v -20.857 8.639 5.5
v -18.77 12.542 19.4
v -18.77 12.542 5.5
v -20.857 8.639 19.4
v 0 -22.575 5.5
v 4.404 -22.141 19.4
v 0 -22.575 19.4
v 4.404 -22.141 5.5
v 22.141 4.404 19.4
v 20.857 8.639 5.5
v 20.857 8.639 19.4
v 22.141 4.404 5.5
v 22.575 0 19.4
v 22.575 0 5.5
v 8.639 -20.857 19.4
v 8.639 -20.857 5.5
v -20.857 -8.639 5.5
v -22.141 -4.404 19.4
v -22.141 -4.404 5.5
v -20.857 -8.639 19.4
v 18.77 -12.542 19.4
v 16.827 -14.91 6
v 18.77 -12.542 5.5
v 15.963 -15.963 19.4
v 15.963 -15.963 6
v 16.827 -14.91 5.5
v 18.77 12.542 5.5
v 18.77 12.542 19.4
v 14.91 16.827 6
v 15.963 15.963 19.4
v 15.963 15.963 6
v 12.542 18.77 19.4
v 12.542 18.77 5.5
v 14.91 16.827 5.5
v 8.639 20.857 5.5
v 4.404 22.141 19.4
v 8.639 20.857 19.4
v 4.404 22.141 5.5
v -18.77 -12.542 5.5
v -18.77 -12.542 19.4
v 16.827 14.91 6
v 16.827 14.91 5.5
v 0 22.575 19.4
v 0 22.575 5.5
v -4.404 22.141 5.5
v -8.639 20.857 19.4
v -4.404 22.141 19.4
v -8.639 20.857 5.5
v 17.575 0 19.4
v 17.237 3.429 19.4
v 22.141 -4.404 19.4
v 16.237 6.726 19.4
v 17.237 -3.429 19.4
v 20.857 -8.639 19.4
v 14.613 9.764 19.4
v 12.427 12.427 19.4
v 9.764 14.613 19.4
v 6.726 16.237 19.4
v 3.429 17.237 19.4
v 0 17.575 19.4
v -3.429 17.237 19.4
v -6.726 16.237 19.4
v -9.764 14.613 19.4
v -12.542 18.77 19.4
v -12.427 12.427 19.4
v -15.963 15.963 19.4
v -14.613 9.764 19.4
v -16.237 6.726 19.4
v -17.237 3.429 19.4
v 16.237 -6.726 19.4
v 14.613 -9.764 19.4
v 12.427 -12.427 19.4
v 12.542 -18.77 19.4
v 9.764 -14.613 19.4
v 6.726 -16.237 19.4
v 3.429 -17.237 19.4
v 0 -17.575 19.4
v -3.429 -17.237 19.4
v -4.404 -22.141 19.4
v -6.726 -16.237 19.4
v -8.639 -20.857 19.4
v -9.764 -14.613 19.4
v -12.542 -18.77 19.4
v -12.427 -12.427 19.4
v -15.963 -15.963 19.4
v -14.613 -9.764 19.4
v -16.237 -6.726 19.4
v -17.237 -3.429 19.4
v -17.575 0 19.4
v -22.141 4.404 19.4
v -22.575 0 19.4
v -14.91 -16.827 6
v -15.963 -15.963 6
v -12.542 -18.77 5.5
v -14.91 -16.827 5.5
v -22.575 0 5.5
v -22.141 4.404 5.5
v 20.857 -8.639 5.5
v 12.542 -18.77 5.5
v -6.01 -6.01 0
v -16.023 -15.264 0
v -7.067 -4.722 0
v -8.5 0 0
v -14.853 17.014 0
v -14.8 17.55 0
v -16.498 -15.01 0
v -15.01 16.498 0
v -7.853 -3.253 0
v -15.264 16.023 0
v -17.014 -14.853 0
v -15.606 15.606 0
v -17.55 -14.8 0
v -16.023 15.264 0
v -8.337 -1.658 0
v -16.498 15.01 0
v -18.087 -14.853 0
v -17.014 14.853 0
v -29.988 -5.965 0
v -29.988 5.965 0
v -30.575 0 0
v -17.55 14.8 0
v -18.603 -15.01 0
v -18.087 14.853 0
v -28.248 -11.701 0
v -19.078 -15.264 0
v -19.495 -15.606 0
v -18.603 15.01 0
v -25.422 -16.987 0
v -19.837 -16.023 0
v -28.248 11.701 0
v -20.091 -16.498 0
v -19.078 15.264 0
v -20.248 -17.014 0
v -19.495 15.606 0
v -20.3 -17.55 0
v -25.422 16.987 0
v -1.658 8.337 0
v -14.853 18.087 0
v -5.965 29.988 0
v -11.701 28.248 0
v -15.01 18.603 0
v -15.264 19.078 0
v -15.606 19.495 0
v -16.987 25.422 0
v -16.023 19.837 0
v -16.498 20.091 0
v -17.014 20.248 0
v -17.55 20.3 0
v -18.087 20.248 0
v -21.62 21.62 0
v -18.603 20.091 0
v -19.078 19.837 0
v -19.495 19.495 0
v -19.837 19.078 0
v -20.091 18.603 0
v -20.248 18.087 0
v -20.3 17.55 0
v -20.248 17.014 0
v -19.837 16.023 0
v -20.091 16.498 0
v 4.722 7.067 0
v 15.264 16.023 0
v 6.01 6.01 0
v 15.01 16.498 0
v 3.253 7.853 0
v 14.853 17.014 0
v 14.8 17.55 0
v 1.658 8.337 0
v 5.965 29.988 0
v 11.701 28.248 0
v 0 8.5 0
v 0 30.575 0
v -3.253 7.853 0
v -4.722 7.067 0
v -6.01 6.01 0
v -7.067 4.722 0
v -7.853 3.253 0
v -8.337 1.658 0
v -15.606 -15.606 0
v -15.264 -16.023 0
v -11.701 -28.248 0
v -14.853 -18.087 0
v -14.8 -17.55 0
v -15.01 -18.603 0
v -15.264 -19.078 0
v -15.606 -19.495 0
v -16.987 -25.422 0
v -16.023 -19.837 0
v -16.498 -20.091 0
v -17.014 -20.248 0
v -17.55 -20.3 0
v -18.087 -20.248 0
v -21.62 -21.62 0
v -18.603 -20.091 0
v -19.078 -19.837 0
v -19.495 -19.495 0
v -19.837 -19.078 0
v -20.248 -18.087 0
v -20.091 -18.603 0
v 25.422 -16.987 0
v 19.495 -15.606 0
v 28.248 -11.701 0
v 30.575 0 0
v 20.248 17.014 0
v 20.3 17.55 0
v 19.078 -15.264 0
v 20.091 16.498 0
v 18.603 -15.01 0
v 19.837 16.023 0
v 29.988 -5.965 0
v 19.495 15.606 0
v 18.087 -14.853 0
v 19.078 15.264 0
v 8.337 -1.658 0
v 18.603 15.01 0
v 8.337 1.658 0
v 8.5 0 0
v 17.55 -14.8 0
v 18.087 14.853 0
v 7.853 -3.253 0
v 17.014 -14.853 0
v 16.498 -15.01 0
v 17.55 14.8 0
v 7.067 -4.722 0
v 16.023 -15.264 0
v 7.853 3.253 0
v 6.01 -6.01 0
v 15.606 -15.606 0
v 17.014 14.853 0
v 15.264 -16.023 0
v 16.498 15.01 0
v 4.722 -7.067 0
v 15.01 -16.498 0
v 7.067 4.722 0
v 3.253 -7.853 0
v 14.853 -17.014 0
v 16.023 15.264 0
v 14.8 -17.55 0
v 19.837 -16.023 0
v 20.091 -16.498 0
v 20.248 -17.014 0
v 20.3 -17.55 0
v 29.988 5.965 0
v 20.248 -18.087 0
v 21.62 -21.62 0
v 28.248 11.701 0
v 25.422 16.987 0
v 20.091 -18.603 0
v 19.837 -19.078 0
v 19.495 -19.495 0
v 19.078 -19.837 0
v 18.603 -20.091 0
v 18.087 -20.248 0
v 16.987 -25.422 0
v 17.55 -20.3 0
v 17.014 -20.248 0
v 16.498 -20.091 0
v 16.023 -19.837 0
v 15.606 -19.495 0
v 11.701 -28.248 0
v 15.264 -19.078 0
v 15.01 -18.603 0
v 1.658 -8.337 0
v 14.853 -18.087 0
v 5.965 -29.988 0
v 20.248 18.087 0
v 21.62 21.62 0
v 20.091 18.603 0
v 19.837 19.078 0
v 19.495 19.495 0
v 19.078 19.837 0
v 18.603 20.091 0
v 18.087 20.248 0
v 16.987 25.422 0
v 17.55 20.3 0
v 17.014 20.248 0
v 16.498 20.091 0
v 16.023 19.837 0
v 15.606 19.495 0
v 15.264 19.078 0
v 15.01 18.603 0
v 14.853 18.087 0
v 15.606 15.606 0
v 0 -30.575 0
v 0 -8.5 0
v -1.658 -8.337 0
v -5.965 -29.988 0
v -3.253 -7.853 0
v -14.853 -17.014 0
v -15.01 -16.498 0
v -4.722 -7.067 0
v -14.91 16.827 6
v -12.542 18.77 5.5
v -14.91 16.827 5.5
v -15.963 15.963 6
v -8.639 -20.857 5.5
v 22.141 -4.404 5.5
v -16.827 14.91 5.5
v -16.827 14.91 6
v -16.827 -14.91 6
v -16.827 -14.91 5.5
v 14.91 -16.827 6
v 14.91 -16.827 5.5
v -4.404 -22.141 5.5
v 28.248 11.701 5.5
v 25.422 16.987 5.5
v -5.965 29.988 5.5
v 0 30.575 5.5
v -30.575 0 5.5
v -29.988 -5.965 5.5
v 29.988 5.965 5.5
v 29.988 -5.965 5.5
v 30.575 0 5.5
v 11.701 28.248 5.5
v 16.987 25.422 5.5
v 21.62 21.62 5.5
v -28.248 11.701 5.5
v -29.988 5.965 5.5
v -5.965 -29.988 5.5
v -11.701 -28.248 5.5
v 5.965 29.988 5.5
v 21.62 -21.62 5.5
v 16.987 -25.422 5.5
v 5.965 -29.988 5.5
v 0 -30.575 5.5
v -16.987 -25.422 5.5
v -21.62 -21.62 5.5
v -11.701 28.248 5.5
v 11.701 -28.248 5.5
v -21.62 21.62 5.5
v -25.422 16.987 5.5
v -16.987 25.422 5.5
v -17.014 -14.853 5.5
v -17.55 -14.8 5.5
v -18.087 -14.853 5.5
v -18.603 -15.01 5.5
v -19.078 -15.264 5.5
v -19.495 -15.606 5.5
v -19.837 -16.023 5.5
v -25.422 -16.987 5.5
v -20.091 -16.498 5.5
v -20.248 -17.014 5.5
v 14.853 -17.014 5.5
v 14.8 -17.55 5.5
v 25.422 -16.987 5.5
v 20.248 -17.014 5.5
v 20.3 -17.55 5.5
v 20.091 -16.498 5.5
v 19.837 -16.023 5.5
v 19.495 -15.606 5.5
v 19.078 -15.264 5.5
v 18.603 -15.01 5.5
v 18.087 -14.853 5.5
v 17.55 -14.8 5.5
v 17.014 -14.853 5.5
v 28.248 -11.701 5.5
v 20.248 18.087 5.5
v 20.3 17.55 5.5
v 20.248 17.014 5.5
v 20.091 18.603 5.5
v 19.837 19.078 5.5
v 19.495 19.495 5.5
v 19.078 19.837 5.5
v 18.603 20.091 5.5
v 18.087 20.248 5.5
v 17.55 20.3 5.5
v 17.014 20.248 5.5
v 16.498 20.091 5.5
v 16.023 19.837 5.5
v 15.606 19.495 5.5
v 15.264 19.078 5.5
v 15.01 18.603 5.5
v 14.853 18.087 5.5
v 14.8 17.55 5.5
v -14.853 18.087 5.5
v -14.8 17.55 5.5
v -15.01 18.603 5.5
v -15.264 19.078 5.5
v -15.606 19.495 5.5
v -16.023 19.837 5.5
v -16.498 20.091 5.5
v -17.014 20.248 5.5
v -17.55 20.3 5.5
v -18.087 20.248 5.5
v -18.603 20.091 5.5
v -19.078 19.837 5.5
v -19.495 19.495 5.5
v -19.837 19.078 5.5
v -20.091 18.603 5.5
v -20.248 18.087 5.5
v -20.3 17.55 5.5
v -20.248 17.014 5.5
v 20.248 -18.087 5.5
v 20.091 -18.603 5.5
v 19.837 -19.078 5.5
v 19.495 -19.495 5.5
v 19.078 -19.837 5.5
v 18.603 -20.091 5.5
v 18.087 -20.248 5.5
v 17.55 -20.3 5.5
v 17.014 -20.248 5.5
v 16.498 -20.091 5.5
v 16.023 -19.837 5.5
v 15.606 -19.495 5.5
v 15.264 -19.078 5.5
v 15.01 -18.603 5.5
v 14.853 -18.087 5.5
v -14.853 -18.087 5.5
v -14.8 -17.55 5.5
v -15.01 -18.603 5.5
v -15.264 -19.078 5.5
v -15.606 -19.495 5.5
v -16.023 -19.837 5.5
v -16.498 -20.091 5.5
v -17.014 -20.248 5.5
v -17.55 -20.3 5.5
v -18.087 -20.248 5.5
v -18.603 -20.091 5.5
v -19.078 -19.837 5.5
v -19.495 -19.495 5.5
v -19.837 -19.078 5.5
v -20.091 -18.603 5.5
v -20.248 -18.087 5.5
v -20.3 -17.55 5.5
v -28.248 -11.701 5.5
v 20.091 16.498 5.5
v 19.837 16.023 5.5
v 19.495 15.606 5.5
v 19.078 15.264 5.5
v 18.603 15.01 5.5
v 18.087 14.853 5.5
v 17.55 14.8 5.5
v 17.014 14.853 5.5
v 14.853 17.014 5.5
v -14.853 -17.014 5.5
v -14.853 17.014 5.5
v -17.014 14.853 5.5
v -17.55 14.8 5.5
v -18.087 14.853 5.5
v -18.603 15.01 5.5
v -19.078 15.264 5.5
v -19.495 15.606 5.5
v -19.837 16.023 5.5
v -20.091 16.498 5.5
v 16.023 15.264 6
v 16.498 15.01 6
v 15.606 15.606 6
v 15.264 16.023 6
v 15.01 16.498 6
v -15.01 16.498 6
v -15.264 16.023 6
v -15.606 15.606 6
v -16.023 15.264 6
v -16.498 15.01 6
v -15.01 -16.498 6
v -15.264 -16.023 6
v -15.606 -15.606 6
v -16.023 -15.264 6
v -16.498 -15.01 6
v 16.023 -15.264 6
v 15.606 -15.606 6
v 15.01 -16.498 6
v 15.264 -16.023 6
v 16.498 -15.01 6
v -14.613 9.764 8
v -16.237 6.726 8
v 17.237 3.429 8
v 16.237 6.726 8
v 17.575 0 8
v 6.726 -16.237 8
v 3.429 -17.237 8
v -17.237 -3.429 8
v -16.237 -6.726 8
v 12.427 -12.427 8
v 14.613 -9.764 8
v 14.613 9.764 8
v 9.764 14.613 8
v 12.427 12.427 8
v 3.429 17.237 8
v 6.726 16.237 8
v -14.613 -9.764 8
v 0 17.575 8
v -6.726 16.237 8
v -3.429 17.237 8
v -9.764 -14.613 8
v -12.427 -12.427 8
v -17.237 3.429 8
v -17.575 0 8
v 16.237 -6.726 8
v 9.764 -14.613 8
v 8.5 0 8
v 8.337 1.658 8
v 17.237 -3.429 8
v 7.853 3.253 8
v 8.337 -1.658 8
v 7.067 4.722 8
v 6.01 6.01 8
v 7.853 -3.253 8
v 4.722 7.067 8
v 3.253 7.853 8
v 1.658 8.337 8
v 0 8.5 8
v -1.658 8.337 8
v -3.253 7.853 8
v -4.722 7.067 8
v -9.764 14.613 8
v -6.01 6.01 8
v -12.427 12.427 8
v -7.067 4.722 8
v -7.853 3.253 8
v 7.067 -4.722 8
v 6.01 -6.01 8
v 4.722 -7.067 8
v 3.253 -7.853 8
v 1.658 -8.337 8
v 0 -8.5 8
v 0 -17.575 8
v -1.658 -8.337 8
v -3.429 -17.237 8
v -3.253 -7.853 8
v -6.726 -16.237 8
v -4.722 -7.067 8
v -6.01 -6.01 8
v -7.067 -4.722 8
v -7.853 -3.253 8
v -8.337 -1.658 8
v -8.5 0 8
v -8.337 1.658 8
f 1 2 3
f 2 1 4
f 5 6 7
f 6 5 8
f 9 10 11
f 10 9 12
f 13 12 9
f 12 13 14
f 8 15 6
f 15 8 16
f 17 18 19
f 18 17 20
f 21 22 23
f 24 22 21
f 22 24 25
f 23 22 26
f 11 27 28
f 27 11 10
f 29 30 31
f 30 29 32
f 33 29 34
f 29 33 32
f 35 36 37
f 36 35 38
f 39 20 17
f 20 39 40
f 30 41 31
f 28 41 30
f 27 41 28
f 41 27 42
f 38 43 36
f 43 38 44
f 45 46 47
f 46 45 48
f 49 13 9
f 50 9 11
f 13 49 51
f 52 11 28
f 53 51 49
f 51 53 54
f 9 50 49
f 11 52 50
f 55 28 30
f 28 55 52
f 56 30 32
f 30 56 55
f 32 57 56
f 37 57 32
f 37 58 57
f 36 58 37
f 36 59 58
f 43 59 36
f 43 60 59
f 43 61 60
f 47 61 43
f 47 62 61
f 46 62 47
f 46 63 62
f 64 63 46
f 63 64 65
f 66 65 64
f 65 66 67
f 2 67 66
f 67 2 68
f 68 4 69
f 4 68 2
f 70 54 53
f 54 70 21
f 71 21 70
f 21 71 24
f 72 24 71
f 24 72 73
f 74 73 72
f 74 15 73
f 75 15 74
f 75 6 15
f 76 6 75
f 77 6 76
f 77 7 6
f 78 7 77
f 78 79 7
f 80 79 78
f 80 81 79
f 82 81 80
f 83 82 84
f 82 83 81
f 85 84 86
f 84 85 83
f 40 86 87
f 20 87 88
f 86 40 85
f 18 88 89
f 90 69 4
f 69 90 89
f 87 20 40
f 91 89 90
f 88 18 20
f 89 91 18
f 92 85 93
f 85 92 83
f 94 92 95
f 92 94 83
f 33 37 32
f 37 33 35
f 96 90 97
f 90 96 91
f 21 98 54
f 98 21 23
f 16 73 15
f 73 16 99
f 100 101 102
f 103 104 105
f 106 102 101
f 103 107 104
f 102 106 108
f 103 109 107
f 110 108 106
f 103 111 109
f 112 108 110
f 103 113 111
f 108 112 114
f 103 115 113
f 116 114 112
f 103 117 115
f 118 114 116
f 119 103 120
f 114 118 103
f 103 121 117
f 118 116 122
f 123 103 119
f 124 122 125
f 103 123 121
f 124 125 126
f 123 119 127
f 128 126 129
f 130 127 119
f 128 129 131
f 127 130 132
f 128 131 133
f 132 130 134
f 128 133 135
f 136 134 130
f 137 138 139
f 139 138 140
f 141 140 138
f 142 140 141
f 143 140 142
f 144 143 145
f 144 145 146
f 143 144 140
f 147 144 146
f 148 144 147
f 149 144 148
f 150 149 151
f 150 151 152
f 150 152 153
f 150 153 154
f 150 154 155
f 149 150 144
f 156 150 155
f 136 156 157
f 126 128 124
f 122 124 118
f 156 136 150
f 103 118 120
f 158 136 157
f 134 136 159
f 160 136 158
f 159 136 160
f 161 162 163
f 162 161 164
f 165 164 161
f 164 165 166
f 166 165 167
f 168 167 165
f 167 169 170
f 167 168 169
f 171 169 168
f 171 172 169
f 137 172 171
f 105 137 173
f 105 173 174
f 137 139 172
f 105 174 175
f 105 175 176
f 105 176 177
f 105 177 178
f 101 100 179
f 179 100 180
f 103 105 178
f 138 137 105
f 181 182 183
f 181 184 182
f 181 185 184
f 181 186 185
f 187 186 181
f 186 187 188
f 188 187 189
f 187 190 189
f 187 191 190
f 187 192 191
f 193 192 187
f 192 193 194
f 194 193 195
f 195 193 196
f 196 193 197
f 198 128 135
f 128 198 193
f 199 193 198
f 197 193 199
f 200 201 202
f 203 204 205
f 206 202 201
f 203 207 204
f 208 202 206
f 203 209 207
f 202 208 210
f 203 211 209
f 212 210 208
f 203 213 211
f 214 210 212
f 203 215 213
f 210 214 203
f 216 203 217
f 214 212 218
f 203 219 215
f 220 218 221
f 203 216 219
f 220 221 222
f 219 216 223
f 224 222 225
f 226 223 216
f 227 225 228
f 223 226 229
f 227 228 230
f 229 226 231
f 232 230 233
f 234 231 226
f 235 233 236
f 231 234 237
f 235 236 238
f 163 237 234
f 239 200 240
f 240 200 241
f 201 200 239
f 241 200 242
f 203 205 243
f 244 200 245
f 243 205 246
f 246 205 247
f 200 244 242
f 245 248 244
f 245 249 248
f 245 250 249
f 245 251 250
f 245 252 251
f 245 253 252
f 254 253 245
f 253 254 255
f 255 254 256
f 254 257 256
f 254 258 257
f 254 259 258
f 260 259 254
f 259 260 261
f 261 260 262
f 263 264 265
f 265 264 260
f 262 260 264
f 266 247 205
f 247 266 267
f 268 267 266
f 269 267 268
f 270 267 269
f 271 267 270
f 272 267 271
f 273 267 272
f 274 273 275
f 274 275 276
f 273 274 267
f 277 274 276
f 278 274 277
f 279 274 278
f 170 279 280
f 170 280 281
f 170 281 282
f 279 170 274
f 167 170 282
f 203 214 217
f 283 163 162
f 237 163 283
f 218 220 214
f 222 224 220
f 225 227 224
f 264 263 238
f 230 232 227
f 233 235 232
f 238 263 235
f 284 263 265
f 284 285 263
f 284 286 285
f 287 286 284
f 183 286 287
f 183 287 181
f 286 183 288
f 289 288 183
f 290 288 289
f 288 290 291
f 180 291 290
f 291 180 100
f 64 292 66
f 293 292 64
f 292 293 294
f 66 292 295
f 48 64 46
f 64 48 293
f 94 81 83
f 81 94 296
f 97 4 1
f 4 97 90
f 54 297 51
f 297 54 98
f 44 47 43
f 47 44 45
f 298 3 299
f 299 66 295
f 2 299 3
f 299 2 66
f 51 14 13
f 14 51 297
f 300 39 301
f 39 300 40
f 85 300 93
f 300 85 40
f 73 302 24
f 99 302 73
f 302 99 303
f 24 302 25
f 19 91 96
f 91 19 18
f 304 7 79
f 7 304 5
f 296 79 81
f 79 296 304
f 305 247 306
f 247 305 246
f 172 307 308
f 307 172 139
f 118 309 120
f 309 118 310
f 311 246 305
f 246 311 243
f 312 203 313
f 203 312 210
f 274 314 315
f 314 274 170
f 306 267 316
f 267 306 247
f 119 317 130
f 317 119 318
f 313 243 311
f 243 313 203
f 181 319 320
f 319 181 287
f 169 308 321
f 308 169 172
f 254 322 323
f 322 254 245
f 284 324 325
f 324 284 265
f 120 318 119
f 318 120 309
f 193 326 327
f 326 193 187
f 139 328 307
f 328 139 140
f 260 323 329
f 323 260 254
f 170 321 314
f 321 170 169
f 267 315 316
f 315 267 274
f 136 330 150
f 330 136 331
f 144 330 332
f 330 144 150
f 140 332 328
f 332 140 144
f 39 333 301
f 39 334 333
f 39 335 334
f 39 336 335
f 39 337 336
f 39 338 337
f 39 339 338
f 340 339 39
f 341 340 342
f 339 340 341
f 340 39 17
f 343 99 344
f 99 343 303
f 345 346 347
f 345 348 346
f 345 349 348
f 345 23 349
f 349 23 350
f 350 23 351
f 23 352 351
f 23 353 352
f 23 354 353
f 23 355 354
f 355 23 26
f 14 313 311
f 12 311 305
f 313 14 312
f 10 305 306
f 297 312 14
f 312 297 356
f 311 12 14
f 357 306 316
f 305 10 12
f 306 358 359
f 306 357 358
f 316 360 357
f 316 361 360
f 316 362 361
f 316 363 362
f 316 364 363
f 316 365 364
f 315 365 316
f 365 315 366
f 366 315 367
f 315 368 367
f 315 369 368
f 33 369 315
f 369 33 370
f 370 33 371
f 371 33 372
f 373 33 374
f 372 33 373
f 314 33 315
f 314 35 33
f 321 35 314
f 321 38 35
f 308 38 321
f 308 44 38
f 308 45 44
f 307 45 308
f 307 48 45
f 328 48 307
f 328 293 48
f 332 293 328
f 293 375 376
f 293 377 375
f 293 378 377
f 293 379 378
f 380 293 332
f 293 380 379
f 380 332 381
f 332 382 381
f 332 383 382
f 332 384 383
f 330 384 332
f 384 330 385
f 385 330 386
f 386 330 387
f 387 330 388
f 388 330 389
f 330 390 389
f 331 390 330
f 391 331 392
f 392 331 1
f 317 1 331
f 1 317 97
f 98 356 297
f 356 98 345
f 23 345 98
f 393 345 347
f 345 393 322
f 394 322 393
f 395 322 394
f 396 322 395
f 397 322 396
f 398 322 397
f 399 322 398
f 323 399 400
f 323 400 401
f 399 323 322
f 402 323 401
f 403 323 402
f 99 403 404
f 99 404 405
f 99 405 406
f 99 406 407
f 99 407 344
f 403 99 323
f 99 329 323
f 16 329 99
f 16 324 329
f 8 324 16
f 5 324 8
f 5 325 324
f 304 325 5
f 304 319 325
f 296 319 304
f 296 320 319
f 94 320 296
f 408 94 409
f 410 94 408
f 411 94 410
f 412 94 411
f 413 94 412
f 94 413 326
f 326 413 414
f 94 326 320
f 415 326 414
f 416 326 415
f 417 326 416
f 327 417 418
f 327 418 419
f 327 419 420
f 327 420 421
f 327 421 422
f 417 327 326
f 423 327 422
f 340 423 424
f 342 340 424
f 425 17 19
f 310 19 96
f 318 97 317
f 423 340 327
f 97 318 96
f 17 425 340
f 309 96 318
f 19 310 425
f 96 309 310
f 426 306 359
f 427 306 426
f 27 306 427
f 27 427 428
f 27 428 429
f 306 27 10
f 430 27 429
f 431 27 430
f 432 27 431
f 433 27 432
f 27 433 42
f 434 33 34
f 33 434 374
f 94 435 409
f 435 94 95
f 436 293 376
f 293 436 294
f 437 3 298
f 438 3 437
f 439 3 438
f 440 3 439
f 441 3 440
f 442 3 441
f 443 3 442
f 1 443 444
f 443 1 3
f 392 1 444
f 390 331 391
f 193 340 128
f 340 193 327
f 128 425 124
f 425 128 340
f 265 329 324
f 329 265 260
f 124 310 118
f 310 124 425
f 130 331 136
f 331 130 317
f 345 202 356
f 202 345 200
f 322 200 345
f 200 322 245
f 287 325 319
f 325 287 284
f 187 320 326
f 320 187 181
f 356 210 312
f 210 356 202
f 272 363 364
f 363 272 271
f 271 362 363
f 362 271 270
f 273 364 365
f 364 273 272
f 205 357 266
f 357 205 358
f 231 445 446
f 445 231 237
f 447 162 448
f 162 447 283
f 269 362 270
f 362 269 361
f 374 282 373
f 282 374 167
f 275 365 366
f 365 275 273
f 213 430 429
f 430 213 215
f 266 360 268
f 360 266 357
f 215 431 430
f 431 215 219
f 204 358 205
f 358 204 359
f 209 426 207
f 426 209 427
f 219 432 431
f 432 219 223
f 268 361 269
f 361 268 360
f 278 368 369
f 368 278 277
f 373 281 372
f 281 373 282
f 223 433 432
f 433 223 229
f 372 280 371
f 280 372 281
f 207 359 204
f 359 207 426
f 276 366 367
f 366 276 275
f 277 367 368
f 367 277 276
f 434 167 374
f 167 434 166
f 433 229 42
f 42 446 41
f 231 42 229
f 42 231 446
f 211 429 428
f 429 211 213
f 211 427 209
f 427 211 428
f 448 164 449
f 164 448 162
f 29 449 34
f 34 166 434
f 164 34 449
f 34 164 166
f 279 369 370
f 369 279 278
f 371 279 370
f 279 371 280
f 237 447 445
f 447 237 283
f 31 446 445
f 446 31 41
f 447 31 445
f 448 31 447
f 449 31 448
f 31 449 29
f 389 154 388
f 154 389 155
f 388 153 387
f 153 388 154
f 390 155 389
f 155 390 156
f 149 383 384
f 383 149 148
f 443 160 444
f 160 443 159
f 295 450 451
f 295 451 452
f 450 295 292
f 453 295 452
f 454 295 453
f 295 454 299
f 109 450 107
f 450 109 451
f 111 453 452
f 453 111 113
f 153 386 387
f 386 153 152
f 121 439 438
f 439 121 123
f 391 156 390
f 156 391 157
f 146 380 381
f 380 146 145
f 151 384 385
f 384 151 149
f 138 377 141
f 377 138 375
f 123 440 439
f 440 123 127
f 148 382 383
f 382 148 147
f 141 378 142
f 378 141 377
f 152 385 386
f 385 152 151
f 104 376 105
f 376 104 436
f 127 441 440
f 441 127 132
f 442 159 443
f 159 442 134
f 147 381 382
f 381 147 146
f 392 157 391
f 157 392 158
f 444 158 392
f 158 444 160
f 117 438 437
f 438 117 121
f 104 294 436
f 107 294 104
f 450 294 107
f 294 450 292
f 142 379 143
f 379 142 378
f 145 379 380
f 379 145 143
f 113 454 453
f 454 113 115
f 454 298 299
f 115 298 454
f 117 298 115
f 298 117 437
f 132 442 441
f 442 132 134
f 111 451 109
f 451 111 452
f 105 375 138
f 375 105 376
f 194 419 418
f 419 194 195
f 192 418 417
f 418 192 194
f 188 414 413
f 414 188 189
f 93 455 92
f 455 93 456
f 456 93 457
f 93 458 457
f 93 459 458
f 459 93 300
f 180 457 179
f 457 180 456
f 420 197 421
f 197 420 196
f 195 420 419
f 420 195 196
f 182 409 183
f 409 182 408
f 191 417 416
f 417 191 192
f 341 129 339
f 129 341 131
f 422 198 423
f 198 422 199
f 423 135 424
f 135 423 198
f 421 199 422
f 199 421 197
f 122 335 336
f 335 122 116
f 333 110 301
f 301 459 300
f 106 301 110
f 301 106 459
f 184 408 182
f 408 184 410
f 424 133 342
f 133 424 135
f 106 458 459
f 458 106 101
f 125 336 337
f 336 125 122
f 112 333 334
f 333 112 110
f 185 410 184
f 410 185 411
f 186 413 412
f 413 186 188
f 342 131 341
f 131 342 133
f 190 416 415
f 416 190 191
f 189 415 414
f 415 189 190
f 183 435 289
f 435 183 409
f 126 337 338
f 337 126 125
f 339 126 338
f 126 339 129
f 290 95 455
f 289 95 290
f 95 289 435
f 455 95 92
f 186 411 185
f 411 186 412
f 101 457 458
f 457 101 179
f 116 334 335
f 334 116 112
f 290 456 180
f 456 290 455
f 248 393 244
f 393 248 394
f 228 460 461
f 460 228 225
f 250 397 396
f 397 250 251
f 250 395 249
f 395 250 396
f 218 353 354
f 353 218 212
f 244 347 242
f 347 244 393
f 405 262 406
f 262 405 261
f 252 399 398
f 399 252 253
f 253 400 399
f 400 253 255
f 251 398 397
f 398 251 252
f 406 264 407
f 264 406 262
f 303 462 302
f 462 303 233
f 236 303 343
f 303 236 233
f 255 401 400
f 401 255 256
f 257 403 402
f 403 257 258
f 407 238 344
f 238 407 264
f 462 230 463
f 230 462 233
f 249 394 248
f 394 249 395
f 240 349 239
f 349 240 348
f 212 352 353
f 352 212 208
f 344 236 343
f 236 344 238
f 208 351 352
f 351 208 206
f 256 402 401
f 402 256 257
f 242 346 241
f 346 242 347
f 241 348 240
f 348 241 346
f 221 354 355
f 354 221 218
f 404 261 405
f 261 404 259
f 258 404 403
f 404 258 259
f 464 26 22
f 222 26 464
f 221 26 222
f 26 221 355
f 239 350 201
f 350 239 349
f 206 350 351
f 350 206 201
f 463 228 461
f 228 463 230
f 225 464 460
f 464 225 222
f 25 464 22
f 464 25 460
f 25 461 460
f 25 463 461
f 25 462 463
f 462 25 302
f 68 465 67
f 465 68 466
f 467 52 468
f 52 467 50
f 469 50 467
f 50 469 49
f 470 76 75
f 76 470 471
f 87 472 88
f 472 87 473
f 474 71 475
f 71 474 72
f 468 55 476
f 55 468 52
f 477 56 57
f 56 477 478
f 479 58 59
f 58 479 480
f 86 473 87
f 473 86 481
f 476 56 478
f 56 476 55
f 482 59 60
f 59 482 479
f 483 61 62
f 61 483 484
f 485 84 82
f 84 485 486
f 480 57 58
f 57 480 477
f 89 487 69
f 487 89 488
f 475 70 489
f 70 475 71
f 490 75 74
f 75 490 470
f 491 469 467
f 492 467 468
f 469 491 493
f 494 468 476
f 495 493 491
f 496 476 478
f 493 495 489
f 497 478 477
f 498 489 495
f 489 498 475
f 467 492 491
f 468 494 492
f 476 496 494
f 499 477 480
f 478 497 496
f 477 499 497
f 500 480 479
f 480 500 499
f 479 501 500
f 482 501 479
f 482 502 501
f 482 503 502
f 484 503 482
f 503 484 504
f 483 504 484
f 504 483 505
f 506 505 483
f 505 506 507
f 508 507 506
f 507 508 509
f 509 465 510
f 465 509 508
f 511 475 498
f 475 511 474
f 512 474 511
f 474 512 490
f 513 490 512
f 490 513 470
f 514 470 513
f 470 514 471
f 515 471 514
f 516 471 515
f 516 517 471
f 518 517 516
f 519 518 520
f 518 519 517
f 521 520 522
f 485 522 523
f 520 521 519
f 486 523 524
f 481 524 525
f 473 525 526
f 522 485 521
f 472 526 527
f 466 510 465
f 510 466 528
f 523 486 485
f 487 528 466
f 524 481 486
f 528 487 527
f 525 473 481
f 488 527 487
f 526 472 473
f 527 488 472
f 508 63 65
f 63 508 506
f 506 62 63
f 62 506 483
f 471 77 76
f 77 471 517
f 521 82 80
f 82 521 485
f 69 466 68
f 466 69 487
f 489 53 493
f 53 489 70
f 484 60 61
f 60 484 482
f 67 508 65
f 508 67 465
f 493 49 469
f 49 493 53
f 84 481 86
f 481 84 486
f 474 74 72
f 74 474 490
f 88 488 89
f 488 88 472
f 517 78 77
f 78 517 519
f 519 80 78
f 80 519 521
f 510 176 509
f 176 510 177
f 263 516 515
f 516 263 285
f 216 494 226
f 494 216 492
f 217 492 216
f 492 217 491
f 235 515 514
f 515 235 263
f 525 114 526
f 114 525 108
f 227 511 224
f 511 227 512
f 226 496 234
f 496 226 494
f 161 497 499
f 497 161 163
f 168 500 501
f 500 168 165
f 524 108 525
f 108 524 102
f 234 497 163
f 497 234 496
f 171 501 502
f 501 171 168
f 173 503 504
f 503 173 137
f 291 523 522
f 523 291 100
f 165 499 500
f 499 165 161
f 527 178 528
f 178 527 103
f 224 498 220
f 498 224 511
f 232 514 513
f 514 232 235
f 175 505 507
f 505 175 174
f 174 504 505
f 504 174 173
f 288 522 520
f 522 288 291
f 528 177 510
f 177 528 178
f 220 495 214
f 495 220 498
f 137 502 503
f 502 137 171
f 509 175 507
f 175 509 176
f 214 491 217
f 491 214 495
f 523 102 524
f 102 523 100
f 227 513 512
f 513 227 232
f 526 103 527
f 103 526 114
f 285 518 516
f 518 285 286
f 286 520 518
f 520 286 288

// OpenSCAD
$fn = 32;

// ----------------------------------------------------------------------
// Bearing housing: seat for 6202 (35 x 11 mm), 45.15 mm body
// ----------------------------------------------------------------------

// --- parameters (mm) ---
case_d = 45.15;           // housing outside diameter
case_h = 19.4;            // overall housing height
rim_t = 5;                // wall thickness
bearing_seat = 35.15;     // 6202 seat, 0.15 mm clearance
seat_h = 11.4;            // pocket depth
shoulder = 4;             // shoulder under the bearing
pass_d = 17;              // shaft passage
ear_d = 61.15;            // mounting flange diameter
flange_t = 4;             // flange thickness
bolt_d = 5.5;             // flange bolt clearance
bolt_r = 24.82;           // flange bolt circle radius

module body() {
  cylinder(h = case_h, d = case_d);
}

module flange() {
  /* flange sunk 1.5 mm into the body */
  cylinder(h = flange_t + 1.5, d = ear_d);
}

difference() {
  union() {
    body();
    flange();
  }
  translate([0, 0, case_h - seat_h]) cylinder(h = seat_h + 1, d = bearing_seat);
  translate([0, 0, -1]) cylinder(h = case_h - seat_h + 1, d = pass_d);
  for (i = [0 : 3]) rotate([0, 0, 45 + i * 90]) translate([bolt_r, 0, -1])
    cylinder(h = flange_t + 3, d = bolt_d);
}
